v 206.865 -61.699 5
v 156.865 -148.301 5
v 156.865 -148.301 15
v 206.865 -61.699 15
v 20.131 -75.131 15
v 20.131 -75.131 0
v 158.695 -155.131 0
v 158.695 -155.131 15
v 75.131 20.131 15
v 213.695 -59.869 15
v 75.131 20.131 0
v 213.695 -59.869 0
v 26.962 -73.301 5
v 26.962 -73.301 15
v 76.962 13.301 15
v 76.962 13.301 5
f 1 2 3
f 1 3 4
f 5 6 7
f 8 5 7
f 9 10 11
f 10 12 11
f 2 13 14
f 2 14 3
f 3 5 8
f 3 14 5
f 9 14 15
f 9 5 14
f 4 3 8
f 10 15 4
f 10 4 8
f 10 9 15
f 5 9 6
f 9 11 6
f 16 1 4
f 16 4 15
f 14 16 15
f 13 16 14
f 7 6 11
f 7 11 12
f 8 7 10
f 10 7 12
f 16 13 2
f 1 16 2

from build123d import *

# Parameters (mm, degrees)
BOSS_EXTRUDE1_DEPTH = 5
BOSS_EXTRUDE2_DEPTH = 10


with BuildPart() as part:
    # Sketch1 → Boss-Extrude1 (new body)
    with BuildSketch(Plane.XY):
        Polygon((75.131397208, 20.131397208), (20.131397208, -75.131397208), (158.695461814, -155.131397208), (213.695461814, -59.868602792), align=None)
    extrude(amount=BOSS_EXTRUDE1_DEPTH)

    # Sketch2 → Boss-Extrude2 (add)
    with BuildSketch(Plane.XY.offset(5)):
        Polygon((158.695461814, -155.131397208), (213.695461814, -59.868602792), (75.131397208, 20.131397208), (20.131397208, -75.131397208), align=None)
        Polygon((26.961524227, -73.301270189), (156.865334795, -148.301270189), (206.865334795, -61.698729811), (76.961524227, 13.301270189), align=None, mode=Mode.SUBTRACT)
    extrude(amount=BOSS_EXTRUDE2_DEPTH)


solid = part.part
